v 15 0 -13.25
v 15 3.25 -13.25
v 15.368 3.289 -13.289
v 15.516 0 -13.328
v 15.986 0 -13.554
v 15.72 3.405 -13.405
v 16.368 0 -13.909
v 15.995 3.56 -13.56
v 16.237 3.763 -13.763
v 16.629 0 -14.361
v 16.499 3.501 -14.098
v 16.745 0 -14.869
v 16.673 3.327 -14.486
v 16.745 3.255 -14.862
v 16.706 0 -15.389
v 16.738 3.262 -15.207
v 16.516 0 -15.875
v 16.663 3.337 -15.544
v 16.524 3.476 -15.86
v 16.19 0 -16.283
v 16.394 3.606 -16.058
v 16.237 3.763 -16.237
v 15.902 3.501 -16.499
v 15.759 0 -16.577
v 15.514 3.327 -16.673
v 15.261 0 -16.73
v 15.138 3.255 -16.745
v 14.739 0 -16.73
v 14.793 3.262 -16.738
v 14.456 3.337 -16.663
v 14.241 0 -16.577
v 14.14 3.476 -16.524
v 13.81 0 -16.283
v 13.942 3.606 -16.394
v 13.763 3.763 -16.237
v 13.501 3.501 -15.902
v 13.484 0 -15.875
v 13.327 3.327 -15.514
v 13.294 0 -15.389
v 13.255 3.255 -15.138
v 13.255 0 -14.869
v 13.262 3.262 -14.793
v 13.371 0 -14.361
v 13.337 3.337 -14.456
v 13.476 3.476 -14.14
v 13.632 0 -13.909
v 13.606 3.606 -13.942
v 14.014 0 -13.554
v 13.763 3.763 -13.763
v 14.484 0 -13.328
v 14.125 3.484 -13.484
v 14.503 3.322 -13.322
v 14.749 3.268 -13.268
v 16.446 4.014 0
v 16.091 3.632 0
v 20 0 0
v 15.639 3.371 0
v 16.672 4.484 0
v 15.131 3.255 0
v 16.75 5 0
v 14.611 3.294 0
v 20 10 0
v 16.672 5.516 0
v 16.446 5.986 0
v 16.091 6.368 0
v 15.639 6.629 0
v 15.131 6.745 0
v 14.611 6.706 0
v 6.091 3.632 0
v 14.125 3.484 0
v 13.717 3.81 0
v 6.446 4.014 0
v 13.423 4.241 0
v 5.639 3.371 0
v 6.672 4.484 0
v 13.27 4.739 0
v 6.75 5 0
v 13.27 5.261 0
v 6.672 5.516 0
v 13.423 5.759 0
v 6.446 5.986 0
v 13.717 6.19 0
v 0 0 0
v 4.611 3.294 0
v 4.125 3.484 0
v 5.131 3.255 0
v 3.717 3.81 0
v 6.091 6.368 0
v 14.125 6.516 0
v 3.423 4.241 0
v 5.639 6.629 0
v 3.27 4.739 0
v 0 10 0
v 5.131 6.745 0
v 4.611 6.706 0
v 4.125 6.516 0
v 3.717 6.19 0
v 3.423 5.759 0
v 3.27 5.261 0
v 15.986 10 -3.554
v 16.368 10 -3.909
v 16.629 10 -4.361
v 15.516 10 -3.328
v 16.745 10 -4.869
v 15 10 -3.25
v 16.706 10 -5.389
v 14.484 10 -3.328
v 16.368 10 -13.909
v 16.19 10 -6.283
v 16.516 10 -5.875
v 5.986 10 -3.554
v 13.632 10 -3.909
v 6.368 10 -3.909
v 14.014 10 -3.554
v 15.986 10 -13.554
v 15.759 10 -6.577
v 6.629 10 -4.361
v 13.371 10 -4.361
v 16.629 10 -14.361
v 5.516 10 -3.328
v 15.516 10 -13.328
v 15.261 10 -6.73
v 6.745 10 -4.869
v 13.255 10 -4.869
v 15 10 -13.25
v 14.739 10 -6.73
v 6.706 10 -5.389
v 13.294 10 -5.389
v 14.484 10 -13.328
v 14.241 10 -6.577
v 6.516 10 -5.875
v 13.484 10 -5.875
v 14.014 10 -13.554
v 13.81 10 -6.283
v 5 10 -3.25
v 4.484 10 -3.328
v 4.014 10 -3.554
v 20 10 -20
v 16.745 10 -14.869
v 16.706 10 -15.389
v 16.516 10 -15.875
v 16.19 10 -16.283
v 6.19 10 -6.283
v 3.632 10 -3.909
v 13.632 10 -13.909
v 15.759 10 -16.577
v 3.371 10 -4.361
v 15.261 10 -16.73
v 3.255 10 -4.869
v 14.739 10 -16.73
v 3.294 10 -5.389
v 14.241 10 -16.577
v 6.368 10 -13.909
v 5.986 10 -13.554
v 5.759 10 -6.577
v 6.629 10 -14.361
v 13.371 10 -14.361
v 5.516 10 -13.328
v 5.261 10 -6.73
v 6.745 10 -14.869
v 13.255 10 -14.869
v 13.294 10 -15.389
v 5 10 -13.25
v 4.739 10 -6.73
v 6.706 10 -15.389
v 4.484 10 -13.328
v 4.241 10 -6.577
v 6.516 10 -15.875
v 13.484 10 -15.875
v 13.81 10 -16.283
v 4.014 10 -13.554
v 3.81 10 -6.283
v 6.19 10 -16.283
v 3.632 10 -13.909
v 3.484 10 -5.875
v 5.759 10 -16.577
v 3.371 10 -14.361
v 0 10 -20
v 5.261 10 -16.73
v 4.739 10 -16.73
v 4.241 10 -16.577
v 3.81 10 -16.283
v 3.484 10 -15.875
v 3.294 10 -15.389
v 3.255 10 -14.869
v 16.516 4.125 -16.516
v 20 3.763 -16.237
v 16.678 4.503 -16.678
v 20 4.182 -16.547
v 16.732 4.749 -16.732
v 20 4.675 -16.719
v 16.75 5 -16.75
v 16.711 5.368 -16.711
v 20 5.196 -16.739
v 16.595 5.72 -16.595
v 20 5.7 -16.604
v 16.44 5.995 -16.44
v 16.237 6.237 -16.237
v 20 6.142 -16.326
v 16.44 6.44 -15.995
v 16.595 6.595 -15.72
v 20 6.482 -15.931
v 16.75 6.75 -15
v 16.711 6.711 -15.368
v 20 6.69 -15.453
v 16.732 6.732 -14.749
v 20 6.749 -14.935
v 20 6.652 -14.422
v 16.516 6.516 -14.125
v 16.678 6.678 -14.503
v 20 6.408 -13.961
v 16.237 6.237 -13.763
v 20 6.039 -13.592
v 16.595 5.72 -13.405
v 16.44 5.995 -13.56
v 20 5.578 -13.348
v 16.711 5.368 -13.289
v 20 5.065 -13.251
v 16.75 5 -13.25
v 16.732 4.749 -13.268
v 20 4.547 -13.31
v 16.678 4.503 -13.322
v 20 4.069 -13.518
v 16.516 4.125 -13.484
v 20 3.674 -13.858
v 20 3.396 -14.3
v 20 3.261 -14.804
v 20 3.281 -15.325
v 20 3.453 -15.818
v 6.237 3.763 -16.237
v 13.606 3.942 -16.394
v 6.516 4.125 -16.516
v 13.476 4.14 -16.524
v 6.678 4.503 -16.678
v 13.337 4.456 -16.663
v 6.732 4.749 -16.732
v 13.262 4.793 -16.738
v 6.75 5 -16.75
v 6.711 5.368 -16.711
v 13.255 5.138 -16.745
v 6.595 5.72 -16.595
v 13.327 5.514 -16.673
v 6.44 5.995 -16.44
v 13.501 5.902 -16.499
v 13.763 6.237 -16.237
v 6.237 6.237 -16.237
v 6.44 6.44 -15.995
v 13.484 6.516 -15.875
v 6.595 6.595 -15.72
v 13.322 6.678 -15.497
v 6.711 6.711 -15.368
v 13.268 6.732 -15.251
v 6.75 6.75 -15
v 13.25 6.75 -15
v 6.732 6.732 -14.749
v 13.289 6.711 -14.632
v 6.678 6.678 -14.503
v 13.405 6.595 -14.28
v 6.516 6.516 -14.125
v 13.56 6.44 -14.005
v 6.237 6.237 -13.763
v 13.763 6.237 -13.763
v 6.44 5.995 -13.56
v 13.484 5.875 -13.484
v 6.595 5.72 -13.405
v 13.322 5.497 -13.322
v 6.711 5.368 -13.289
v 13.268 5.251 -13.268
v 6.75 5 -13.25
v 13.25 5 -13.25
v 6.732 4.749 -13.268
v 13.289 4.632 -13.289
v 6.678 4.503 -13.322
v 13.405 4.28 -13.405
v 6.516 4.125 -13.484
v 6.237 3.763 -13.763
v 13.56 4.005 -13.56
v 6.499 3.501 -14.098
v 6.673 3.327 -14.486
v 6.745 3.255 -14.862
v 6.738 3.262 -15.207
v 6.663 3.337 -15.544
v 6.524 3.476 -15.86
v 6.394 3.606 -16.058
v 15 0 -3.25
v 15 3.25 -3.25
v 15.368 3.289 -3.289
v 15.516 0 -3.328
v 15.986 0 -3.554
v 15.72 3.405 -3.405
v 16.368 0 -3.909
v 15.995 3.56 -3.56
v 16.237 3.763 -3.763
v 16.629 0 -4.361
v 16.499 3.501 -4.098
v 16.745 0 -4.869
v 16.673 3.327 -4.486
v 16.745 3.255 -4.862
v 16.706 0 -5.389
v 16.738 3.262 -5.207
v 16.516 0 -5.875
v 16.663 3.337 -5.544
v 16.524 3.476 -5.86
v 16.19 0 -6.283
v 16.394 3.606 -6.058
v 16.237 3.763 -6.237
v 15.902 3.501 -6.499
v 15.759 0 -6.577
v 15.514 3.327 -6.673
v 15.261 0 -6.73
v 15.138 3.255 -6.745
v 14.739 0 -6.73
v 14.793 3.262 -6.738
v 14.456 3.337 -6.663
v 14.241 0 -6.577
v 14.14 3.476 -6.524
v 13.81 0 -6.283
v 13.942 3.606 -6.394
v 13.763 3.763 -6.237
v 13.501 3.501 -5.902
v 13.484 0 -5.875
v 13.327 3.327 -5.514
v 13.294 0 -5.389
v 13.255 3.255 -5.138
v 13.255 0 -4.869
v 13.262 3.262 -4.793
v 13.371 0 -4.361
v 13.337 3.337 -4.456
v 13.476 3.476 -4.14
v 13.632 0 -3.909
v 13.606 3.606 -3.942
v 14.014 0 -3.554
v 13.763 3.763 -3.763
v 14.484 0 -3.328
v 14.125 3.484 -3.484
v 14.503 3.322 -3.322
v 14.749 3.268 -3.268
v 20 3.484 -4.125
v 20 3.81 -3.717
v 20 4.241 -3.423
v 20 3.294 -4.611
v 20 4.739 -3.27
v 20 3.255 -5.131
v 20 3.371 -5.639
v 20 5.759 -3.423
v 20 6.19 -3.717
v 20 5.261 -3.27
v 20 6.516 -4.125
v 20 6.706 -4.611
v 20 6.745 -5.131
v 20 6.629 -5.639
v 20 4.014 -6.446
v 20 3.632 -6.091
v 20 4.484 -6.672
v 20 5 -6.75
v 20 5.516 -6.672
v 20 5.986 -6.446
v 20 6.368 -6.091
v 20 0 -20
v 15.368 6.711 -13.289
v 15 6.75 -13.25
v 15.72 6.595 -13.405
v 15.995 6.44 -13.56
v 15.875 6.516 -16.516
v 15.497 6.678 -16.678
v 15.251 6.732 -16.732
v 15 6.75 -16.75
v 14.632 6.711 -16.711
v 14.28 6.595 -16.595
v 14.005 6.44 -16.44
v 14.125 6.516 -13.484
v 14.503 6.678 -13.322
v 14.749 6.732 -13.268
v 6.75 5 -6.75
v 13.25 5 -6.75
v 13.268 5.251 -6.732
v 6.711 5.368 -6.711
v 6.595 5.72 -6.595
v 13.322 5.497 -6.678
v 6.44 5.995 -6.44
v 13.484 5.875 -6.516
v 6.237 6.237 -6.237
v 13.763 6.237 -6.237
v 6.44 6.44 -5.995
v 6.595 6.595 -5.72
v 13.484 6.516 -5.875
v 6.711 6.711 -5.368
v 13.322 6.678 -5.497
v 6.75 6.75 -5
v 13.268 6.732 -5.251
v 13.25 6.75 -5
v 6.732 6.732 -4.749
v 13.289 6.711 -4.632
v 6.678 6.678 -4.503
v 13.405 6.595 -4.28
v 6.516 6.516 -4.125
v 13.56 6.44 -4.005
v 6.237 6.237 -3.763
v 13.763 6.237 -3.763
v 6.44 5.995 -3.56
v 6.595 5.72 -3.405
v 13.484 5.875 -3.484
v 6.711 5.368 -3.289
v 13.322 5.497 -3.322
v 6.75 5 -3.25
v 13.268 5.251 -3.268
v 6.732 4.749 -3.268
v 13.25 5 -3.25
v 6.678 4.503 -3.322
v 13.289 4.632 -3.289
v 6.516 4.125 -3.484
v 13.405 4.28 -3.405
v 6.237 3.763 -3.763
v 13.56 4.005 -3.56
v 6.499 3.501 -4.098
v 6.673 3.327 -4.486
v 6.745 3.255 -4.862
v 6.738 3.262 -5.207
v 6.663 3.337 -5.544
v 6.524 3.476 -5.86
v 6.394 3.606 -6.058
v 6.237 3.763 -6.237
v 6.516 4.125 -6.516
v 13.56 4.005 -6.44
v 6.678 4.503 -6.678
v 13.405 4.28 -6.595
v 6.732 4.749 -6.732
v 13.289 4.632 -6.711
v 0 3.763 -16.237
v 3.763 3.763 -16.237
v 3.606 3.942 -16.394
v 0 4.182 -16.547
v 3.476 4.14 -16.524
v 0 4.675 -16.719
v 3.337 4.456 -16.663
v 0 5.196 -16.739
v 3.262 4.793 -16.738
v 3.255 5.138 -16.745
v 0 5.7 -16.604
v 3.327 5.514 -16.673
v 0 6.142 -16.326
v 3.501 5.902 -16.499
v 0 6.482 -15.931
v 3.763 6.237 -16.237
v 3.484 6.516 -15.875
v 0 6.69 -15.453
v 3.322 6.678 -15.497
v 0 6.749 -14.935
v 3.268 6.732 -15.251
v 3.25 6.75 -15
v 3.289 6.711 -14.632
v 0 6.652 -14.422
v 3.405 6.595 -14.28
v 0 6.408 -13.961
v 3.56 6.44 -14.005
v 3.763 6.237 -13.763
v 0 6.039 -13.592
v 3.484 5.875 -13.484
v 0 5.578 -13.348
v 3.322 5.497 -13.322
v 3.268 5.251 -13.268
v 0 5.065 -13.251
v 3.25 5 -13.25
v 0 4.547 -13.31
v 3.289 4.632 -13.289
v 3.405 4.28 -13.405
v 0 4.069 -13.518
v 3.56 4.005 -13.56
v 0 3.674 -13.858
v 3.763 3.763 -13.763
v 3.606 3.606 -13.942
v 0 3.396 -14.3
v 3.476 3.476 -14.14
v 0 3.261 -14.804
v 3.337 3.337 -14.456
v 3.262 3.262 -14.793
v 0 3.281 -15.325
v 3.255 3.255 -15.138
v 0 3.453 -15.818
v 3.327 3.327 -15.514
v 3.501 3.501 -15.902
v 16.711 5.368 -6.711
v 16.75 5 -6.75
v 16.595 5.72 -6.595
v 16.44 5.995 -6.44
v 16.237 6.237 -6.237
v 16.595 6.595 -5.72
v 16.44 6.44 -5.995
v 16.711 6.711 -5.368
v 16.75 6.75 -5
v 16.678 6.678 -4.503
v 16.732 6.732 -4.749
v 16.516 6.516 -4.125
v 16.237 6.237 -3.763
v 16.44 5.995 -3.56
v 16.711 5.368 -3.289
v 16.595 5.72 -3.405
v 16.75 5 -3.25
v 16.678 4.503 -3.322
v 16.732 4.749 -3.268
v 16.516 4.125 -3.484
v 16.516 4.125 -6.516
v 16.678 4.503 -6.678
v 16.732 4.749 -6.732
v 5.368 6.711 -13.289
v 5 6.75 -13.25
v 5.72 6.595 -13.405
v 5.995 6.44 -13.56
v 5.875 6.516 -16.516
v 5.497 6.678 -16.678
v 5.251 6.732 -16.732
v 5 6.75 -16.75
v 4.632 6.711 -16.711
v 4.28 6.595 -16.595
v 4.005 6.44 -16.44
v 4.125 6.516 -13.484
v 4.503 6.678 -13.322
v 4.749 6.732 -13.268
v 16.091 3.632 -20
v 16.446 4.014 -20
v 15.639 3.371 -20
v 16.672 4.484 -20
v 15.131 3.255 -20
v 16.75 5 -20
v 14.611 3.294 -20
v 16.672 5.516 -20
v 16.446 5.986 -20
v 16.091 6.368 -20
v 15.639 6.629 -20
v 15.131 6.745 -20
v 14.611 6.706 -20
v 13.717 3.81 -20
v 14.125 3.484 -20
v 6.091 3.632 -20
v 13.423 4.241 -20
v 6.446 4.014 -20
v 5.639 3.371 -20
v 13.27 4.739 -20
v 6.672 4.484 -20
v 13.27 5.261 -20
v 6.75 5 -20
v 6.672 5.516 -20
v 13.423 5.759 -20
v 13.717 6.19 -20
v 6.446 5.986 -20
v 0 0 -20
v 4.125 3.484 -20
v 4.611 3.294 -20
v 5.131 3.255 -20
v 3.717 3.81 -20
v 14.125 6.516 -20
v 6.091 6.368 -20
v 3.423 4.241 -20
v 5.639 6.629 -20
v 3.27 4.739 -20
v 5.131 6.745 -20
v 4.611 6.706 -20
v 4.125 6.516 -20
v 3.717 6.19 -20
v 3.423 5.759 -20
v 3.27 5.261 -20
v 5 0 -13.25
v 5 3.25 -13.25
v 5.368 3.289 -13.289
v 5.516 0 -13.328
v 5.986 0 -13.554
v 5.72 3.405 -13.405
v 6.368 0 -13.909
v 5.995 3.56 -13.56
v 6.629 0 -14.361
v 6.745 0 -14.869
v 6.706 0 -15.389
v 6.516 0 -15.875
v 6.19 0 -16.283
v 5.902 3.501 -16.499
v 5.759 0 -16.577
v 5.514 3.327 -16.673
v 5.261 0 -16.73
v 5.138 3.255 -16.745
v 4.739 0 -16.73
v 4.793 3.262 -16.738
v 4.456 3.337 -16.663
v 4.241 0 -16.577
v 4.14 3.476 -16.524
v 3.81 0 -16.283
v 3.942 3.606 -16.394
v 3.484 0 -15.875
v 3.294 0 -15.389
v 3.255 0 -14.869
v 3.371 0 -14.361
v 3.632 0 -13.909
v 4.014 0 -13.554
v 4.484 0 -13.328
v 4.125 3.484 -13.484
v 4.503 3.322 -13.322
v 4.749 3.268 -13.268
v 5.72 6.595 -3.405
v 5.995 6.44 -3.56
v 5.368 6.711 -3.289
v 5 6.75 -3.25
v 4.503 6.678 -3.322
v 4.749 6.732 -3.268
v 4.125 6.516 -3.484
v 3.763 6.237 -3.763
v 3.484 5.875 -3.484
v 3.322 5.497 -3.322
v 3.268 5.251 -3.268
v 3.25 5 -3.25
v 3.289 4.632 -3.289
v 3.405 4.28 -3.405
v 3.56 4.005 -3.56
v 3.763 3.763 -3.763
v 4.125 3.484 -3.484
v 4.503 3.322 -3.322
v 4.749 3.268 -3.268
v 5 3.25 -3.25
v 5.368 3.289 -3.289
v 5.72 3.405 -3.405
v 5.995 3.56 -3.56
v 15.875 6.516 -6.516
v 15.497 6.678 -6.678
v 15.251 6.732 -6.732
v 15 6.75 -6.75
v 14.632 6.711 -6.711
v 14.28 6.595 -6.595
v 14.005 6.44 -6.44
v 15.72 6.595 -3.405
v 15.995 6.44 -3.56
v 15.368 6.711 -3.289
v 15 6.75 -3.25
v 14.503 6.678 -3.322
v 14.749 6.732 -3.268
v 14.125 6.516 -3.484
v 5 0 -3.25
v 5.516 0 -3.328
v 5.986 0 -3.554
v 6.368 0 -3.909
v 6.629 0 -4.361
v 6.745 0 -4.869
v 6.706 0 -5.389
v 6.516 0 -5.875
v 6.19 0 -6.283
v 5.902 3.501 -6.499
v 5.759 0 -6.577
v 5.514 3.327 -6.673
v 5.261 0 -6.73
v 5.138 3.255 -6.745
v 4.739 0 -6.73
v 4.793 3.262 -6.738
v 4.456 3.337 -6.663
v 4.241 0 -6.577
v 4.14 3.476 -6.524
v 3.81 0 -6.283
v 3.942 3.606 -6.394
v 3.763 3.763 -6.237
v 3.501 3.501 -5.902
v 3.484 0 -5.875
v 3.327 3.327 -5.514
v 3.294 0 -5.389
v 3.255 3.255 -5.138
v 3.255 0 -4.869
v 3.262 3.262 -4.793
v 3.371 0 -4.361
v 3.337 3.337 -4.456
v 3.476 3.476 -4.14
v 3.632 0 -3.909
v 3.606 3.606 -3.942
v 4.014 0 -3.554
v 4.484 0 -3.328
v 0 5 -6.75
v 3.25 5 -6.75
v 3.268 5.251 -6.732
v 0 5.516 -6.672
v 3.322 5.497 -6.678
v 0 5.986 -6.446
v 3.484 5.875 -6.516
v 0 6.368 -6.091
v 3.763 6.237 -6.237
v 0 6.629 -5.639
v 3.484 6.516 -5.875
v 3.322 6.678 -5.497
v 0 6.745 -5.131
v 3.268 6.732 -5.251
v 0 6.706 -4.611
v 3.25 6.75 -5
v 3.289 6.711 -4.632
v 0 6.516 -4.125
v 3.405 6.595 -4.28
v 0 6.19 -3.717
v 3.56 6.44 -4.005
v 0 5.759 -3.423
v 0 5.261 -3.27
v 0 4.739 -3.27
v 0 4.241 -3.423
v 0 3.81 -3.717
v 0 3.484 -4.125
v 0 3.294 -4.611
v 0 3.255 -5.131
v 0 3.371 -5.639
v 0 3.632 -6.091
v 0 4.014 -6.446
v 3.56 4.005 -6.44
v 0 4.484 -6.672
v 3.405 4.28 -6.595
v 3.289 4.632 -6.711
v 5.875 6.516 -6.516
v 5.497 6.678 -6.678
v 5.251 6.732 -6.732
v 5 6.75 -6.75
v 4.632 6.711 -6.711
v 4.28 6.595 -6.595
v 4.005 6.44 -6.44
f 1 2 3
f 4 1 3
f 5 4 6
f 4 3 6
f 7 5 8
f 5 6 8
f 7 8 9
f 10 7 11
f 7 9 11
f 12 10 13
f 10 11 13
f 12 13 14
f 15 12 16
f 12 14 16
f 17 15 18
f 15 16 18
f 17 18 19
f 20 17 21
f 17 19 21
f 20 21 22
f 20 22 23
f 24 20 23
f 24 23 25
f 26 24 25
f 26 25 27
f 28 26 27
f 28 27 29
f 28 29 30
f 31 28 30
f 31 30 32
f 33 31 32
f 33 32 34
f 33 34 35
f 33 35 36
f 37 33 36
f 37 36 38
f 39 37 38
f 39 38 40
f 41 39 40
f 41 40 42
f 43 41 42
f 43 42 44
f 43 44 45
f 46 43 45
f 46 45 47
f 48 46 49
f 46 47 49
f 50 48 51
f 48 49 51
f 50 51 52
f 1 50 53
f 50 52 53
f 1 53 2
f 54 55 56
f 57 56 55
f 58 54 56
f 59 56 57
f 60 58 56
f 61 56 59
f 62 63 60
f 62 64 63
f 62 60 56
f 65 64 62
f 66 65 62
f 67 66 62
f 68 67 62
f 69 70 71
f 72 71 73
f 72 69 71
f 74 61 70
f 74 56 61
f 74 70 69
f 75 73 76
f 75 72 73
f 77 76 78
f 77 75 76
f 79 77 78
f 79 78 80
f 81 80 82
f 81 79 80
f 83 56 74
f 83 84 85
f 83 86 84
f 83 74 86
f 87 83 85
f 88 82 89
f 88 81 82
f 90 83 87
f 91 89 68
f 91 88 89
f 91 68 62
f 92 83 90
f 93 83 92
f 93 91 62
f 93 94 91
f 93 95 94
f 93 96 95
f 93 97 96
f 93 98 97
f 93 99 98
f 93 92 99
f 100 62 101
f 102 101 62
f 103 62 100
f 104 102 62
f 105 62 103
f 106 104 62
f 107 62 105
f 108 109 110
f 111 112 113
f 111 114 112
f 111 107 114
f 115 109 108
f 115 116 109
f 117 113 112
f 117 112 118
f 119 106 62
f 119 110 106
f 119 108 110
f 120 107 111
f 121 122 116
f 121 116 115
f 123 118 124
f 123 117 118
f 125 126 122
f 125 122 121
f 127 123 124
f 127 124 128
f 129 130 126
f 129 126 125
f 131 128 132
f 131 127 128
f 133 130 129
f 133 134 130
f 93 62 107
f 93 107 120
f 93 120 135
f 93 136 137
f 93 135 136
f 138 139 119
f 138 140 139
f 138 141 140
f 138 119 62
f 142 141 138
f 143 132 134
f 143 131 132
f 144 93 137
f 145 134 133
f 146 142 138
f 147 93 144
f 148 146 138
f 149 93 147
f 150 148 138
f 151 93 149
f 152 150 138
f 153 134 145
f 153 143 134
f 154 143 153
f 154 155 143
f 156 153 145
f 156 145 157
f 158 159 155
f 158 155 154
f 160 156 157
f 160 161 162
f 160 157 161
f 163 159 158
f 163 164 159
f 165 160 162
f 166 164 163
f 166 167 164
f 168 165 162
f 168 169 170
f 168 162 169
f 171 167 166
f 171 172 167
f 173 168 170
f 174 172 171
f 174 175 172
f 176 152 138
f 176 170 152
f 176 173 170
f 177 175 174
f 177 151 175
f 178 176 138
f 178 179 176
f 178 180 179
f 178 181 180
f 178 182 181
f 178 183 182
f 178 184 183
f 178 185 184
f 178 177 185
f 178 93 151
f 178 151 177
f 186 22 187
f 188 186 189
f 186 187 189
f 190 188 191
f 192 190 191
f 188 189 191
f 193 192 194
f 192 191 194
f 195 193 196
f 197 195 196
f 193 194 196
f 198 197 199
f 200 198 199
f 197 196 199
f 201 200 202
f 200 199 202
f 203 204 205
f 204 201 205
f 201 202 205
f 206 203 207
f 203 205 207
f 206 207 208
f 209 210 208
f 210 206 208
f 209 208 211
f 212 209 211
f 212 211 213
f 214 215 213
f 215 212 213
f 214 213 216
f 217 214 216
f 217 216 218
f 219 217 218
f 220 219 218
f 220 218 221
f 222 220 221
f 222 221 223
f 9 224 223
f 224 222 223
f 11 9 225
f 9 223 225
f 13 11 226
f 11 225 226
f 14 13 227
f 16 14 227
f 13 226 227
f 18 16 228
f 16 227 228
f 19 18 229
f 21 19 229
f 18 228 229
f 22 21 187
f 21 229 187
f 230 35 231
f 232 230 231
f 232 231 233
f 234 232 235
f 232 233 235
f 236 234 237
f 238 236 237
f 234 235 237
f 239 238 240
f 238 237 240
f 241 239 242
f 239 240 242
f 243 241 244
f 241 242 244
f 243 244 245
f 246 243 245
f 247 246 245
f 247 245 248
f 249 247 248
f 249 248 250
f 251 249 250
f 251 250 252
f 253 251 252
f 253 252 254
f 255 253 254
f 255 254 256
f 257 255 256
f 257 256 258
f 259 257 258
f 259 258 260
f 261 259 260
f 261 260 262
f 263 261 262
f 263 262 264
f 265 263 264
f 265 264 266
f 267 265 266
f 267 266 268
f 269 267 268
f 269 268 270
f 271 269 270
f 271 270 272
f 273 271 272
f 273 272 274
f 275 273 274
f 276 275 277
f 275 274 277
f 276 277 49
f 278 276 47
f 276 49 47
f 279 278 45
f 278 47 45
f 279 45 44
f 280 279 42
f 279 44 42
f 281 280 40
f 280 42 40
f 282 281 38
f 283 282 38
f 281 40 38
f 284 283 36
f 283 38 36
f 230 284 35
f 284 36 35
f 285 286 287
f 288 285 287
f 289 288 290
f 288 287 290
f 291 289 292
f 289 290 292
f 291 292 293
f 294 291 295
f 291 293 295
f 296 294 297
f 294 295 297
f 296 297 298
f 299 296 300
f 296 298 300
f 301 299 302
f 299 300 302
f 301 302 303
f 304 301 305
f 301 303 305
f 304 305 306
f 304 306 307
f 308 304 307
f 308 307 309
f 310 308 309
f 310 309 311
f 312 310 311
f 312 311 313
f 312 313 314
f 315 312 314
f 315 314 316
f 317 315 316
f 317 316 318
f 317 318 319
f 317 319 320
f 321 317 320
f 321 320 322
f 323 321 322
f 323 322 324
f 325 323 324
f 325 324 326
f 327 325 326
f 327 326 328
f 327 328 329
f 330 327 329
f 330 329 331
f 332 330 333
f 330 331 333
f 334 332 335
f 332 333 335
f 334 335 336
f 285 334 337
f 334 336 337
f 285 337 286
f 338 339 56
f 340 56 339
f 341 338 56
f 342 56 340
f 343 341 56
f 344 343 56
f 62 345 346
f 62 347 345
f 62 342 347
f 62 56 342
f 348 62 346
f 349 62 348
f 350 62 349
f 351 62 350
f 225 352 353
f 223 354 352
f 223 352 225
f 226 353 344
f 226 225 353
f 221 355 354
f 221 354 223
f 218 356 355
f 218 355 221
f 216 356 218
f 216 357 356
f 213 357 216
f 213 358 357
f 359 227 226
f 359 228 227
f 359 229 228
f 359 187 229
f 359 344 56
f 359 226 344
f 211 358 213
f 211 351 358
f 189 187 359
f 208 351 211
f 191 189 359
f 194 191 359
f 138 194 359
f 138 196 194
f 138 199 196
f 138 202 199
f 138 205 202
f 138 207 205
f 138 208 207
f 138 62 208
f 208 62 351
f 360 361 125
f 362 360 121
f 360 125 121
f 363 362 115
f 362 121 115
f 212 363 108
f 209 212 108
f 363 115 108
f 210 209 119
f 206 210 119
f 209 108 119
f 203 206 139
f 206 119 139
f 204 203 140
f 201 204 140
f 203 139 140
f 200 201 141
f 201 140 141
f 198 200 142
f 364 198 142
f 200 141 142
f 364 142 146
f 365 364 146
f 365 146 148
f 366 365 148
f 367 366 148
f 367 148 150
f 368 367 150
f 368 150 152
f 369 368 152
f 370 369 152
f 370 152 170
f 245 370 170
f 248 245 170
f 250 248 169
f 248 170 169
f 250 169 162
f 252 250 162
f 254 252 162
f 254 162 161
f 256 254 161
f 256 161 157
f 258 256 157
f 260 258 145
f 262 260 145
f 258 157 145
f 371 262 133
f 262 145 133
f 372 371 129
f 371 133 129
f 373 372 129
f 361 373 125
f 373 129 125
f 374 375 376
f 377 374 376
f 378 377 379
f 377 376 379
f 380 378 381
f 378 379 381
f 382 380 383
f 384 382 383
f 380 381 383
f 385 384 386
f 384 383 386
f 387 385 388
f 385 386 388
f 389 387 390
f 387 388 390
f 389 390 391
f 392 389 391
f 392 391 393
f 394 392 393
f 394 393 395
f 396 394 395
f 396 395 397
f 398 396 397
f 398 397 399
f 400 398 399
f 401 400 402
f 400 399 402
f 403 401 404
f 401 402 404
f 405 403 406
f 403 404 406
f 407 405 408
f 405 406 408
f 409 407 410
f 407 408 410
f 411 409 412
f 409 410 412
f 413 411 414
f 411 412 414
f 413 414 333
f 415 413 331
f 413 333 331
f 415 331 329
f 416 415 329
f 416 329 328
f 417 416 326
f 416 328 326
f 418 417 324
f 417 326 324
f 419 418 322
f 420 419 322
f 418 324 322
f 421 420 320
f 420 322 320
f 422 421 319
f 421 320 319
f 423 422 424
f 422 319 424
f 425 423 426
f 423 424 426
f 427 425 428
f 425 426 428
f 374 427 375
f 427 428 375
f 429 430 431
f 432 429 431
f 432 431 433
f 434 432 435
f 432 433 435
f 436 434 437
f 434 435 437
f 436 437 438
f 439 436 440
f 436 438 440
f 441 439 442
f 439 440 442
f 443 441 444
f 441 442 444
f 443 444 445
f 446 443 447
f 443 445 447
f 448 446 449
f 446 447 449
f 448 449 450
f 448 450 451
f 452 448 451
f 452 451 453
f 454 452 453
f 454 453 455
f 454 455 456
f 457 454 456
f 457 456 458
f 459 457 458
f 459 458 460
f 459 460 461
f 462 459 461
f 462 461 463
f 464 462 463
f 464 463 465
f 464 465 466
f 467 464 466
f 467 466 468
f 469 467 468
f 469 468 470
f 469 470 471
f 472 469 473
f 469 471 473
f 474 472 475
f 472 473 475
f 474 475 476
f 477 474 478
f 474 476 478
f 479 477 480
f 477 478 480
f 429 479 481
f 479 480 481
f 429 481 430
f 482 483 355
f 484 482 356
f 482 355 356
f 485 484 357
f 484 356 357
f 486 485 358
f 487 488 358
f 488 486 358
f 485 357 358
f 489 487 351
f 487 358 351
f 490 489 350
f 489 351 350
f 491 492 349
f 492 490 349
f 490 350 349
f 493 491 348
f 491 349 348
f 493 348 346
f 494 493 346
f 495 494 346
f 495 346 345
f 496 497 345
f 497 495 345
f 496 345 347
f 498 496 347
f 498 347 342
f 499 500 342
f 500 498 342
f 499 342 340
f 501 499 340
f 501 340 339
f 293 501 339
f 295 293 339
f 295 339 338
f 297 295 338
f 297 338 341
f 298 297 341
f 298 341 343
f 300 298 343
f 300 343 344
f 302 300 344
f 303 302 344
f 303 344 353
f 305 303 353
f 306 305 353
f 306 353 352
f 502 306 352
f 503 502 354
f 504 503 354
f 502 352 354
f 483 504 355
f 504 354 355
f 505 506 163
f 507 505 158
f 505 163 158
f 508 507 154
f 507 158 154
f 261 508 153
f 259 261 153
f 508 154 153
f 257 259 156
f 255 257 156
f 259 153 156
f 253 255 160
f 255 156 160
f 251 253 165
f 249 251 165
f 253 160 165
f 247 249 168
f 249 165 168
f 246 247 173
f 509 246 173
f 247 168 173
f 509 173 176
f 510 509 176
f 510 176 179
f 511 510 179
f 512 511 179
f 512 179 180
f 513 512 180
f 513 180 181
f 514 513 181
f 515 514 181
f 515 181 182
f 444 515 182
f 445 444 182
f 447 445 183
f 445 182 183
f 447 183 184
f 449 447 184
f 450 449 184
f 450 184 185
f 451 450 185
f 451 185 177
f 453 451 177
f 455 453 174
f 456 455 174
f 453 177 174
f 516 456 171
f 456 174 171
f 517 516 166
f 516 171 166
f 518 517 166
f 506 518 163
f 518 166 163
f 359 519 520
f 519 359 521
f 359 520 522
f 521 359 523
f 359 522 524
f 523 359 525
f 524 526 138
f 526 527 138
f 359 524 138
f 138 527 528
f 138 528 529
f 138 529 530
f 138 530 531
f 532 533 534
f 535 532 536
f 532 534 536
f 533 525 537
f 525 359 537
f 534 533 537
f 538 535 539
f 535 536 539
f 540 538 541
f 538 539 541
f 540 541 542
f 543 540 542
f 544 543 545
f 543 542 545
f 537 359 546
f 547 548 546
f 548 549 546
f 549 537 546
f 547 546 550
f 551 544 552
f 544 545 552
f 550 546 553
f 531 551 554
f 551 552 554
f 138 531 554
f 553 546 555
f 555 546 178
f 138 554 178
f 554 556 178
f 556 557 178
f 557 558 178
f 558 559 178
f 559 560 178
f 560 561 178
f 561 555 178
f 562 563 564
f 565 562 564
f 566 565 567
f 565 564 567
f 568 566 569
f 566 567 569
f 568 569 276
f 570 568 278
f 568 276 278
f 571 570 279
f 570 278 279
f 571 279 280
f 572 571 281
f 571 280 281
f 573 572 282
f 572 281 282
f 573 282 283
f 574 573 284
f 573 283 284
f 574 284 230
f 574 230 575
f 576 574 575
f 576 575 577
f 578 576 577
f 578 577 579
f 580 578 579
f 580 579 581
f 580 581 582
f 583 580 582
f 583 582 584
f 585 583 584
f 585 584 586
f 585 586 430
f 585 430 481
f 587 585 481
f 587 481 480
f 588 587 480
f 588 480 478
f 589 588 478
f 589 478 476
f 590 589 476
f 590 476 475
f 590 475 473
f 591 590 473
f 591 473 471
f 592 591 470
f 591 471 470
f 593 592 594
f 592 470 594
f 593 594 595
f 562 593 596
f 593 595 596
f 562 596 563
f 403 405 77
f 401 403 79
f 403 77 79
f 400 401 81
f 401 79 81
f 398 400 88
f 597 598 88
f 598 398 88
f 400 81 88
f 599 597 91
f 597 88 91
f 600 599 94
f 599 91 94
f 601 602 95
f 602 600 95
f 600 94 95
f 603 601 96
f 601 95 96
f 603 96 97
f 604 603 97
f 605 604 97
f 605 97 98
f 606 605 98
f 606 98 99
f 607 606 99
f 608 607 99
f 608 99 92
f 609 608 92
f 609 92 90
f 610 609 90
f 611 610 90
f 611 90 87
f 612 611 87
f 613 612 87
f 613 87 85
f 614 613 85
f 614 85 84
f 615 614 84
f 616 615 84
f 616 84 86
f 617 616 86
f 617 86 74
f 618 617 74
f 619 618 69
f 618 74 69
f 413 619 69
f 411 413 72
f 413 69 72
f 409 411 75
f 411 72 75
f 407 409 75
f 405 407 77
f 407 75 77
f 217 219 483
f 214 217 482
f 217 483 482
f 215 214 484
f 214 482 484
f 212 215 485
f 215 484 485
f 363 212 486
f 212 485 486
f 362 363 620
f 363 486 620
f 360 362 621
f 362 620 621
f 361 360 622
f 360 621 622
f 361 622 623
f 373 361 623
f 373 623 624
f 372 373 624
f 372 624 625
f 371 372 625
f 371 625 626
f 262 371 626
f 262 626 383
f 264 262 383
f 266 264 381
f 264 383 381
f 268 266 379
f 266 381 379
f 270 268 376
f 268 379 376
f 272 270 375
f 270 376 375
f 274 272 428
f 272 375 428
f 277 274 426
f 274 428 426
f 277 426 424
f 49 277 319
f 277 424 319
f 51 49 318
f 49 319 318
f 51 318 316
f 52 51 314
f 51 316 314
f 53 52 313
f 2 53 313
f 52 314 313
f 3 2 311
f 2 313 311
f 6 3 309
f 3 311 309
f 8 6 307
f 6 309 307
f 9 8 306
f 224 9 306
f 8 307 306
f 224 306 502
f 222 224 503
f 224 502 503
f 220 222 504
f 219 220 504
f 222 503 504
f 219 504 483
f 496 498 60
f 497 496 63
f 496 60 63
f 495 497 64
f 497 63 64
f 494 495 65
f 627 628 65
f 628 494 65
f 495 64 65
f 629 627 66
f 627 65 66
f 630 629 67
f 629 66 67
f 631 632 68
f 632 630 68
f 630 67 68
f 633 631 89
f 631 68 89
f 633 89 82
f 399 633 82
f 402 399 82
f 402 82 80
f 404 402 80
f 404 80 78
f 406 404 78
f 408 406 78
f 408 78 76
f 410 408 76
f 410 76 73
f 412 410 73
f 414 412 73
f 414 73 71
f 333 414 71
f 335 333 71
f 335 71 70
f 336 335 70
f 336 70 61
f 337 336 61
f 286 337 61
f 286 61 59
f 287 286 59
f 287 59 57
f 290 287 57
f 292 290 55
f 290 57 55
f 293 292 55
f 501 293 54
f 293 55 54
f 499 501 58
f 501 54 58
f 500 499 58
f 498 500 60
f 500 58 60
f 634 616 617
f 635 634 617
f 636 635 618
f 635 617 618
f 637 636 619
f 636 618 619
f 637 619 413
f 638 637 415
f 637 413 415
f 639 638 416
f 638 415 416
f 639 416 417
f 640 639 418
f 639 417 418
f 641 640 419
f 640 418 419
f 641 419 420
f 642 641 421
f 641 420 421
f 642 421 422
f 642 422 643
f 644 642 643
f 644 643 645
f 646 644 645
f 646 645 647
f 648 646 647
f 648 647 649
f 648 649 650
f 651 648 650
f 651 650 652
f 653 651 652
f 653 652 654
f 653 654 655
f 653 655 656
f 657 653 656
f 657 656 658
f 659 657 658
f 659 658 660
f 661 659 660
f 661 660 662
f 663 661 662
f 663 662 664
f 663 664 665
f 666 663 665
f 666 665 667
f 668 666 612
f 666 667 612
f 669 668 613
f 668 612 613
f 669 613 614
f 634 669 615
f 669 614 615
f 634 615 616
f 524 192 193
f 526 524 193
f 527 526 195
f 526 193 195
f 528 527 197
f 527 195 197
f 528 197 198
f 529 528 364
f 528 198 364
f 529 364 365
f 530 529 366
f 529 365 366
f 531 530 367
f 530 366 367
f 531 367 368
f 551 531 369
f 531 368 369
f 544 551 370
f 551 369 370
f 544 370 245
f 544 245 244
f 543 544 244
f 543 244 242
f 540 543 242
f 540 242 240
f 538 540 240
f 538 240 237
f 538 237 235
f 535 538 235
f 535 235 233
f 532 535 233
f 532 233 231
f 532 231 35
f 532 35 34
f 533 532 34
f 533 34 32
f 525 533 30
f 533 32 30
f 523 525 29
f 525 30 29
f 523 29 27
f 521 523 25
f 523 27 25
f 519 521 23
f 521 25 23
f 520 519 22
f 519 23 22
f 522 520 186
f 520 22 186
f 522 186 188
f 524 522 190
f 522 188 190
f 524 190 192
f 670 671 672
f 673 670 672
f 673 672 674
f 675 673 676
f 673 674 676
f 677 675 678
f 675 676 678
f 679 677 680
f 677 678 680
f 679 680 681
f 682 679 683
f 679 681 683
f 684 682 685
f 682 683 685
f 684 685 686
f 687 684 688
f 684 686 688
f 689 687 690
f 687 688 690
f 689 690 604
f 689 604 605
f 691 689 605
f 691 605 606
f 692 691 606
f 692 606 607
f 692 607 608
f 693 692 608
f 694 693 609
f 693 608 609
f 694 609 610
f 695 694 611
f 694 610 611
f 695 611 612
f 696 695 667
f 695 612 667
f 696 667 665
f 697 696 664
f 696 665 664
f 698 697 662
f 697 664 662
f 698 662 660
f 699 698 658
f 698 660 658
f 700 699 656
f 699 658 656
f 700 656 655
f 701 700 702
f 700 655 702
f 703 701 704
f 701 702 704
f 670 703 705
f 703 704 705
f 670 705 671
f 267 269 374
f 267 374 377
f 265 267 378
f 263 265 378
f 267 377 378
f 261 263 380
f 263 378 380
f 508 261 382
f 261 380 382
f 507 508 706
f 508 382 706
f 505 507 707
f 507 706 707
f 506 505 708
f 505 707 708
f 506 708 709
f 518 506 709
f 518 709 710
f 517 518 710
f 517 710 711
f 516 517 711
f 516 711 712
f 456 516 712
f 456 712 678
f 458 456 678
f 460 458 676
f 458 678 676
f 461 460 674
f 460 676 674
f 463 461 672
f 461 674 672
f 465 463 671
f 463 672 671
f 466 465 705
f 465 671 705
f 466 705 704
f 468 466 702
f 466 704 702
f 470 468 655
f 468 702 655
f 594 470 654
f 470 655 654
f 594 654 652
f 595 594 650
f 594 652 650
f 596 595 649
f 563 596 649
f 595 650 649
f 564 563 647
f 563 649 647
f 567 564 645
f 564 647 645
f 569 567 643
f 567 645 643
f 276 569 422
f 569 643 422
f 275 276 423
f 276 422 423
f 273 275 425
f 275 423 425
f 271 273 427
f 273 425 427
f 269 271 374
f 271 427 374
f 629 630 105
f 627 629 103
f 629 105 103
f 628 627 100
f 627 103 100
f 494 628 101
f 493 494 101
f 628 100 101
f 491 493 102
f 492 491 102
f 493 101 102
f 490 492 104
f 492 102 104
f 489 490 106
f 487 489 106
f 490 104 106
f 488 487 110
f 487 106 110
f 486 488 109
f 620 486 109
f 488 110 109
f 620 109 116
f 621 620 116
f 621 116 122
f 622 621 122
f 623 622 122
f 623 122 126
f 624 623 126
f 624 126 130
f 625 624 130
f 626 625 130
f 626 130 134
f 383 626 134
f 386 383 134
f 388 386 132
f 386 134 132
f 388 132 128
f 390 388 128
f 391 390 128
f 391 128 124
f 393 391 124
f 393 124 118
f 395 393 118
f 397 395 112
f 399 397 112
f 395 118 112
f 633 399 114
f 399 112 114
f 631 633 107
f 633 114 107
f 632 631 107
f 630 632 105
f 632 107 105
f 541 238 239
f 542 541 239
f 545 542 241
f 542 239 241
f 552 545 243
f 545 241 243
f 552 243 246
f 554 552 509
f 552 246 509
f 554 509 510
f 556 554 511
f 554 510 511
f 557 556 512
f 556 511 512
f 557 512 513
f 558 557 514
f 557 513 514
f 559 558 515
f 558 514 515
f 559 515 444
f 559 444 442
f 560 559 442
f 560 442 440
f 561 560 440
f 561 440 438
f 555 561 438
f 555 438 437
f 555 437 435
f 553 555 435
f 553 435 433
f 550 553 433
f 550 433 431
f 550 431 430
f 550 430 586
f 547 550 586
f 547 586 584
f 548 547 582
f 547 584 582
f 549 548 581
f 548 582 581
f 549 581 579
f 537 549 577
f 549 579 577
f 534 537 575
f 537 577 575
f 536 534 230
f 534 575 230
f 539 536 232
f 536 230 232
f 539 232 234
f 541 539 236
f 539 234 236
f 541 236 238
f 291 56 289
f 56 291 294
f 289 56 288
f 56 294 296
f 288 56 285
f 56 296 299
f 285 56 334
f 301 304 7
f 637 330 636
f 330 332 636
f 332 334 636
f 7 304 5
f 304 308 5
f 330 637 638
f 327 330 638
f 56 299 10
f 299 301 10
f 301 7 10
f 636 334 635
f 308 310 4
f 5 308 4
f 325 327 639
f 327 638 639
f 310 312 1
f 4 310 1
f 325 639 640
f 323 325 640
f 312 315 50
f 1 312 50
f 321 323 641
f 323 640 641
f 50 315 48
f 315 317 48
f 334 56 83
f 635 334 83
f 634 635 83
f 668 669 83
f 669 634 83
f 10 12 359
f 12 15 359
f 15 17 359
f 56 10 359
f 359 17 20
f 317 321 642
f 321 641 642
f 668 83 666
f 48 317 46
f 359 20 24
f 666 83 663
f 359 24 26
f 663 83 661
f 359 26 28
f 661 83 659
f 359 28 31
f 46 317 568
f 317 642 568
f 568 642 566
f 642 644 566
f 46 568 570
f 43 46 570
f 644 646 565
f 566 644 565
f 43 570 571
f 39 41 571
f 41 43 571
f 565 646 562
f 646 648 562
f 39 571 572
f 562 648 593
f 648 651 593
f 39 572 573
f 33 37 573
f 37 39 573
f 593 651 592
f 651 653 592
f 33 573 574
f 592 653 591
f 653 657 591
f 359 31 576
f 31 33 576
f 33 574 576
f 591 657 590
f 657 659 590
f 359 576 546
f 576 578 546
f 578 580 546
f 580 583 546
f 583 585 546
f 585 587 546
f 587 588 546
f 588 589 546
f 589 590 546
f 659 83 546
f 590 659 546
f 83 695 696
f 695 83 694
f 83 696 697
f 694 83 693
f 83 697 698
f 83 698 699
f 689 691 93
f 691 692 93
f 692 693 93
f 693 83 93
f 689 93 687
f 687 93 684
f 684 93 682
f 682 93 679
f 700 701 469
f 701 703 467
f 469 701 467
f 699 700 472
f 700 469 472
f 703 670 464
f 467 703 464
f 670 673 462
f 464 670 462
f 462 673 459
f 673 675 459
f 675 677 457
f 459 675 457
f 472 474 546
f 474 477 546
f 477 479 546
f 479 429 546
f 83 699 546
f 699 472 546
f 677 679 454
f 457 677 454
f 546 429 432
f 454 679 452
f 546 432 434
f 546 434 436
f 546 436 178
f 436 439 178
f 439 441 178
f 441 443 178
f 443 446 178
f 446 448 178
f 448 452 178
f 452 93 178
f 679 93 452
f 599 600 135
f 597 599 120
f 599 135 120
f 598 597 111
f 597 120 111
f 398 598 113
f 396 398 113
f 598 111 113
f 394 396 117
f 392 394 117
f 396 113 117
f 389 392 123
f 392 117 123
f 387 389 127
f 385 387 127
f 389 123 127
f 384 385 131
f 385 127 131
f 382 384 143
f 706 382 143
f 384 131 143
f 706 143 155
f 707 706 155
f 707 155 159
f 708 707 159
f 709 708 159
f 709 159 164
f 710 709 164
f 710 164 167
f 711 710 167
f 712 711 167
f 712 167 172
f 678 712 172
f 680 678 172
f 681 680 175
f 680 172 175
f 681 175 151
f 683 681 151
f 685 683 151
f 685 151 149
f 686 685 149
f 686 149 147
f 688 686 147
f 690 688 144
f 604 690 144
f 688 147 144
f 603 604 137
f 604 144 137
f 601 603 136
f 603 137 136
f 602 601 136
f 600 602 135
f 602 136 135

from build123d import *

# Parameters (mm, degrees)
ESQUISSE1_W             = 20
ESQUISSE1_H             = 10
BOSS_EXTRU_1_DEPTH      = 20
ESQUISSE2_R             = 1.75
ENL_V_MAT_EXTRU_1_DEPTH = 31
ESQUISSE3_R             = 1.75
ENL_V_MAT_EXTRU_2_DEPTH = 40
ESQUISSE4_R             = 1.75
ENL_V_MAT_EXTRU_3_DEPTH = 40


with BuildPart() as part:
    # Esquisse1 → Boss.-Extru.1 (new body)
    with BuildSketch(Plane(origin=(0, 0, 0), x_dir=(0, 0, -1), z_dir=(1, 0, 0))):
        with Locations((10, 5)):
            Rectangle(ESQUISSE1_W, ESQUISSE1_H)
    extrude(amount=BOSS_EXTRU_1_DEPTH)

    # Esquisse2 → Enlèv. mat.-Extru.1 (cut, through all)
    with BuildSketch(Plane(origin=(0, 10, 0), x_dir=(1, 0, 0), z_dir=(0, 1, 0))):
        with Locations(Location((5, 15, 0), (0, 0, 270))):
            Circle(ESQUISSE2_R)
        with Locations(Location((15, 15, 0), (0, 0, 270))):
            Circle(ESQUISSE2_R)
        with Locations((25, 15)):
            Circle(ESQUISSE2_R)
        with Locations((35, 15)):
            Circle(ESQUISSE2_R)
        with Locations(Location((5, 5, 0), (0, 0, 270))):
            Circle(ESQUISSE2_R)
        with Locations(Location((15, 5, 0), (0, 0, 270))):
            Circle(ESQUISSE2_R)
        with Locations((25, 5)):
            Circle(ESQUISSE2_R)
        with Locations((35, 5)):
            Circle(ESQUISSE2_R)
        with Locations((5, -5)):
            Circle(ESQUISSE2_R)
        with Locations((15, -5)):
            Circle(ESQUISSE2_R)
        with Locations((25, -5)):
            Circle(ESQUISSE2_R)
        with Locations((35, -5)):
            Circle(ESQUISSE2_R)
        with Locations((5, -15)):
            Circle(ESQUISSE2_R)
        with Locations((15, -15)):
            Circle(ESQUISSE2_R)
        with Locations((25, -15)):
            Circle(ESQUISSE2_R)
        with Locations((35, -15)):
            Circle(ESQUISSE2_R)
    extrude(amount=-ENL_V_MAT_EXTRU_1_DEPTH, mode=Mode.SUBTRACT)

    # Esquisse3 → Enlèv. mat.-Extru.2 (cut)
    with BuildSketch(Plane.XY):
        with Locations((5, 5)):
            Circle(ESQUISSE3_R)
        with Locations((15, 5)):
            Circle(ESQUISSE3_R)
        with Locations((25, 5)):
            Circle(ESQUISSE3_R)
        with Locations((35, 5)):
            Circle(ESQUISSE3_R)
    extrude(amount=-ENL_V_MAT_EXTRU_2_DEPTH, mode=Mode.SUBTRACT)

    # Esquisse4 → Enlèv. mat.-Extru.3 (cut)
    with BuildSketch(Plane(origin=(20, 0, 0), x_dir=(0, 0, -1), z_dir=(1, 0, 0))):
        with Locations((5, 5)):
            Circle(ESQUISSE4_R)
        with Locations(Location((15, 5, 0), (0, 0, 315))):
            Circle(ESQUISSE4_R)
        with Locations((25, 5)):
            Circle(ESQUISSE4_R)
        with Locations((35, 5)):
            Circle(ESQUISSE4_R)
    extrude(amount=-ENL_V_MAT_EXTRU_3_DEPTH, mode=Mode.SUBTRACT)


solid = part.part
